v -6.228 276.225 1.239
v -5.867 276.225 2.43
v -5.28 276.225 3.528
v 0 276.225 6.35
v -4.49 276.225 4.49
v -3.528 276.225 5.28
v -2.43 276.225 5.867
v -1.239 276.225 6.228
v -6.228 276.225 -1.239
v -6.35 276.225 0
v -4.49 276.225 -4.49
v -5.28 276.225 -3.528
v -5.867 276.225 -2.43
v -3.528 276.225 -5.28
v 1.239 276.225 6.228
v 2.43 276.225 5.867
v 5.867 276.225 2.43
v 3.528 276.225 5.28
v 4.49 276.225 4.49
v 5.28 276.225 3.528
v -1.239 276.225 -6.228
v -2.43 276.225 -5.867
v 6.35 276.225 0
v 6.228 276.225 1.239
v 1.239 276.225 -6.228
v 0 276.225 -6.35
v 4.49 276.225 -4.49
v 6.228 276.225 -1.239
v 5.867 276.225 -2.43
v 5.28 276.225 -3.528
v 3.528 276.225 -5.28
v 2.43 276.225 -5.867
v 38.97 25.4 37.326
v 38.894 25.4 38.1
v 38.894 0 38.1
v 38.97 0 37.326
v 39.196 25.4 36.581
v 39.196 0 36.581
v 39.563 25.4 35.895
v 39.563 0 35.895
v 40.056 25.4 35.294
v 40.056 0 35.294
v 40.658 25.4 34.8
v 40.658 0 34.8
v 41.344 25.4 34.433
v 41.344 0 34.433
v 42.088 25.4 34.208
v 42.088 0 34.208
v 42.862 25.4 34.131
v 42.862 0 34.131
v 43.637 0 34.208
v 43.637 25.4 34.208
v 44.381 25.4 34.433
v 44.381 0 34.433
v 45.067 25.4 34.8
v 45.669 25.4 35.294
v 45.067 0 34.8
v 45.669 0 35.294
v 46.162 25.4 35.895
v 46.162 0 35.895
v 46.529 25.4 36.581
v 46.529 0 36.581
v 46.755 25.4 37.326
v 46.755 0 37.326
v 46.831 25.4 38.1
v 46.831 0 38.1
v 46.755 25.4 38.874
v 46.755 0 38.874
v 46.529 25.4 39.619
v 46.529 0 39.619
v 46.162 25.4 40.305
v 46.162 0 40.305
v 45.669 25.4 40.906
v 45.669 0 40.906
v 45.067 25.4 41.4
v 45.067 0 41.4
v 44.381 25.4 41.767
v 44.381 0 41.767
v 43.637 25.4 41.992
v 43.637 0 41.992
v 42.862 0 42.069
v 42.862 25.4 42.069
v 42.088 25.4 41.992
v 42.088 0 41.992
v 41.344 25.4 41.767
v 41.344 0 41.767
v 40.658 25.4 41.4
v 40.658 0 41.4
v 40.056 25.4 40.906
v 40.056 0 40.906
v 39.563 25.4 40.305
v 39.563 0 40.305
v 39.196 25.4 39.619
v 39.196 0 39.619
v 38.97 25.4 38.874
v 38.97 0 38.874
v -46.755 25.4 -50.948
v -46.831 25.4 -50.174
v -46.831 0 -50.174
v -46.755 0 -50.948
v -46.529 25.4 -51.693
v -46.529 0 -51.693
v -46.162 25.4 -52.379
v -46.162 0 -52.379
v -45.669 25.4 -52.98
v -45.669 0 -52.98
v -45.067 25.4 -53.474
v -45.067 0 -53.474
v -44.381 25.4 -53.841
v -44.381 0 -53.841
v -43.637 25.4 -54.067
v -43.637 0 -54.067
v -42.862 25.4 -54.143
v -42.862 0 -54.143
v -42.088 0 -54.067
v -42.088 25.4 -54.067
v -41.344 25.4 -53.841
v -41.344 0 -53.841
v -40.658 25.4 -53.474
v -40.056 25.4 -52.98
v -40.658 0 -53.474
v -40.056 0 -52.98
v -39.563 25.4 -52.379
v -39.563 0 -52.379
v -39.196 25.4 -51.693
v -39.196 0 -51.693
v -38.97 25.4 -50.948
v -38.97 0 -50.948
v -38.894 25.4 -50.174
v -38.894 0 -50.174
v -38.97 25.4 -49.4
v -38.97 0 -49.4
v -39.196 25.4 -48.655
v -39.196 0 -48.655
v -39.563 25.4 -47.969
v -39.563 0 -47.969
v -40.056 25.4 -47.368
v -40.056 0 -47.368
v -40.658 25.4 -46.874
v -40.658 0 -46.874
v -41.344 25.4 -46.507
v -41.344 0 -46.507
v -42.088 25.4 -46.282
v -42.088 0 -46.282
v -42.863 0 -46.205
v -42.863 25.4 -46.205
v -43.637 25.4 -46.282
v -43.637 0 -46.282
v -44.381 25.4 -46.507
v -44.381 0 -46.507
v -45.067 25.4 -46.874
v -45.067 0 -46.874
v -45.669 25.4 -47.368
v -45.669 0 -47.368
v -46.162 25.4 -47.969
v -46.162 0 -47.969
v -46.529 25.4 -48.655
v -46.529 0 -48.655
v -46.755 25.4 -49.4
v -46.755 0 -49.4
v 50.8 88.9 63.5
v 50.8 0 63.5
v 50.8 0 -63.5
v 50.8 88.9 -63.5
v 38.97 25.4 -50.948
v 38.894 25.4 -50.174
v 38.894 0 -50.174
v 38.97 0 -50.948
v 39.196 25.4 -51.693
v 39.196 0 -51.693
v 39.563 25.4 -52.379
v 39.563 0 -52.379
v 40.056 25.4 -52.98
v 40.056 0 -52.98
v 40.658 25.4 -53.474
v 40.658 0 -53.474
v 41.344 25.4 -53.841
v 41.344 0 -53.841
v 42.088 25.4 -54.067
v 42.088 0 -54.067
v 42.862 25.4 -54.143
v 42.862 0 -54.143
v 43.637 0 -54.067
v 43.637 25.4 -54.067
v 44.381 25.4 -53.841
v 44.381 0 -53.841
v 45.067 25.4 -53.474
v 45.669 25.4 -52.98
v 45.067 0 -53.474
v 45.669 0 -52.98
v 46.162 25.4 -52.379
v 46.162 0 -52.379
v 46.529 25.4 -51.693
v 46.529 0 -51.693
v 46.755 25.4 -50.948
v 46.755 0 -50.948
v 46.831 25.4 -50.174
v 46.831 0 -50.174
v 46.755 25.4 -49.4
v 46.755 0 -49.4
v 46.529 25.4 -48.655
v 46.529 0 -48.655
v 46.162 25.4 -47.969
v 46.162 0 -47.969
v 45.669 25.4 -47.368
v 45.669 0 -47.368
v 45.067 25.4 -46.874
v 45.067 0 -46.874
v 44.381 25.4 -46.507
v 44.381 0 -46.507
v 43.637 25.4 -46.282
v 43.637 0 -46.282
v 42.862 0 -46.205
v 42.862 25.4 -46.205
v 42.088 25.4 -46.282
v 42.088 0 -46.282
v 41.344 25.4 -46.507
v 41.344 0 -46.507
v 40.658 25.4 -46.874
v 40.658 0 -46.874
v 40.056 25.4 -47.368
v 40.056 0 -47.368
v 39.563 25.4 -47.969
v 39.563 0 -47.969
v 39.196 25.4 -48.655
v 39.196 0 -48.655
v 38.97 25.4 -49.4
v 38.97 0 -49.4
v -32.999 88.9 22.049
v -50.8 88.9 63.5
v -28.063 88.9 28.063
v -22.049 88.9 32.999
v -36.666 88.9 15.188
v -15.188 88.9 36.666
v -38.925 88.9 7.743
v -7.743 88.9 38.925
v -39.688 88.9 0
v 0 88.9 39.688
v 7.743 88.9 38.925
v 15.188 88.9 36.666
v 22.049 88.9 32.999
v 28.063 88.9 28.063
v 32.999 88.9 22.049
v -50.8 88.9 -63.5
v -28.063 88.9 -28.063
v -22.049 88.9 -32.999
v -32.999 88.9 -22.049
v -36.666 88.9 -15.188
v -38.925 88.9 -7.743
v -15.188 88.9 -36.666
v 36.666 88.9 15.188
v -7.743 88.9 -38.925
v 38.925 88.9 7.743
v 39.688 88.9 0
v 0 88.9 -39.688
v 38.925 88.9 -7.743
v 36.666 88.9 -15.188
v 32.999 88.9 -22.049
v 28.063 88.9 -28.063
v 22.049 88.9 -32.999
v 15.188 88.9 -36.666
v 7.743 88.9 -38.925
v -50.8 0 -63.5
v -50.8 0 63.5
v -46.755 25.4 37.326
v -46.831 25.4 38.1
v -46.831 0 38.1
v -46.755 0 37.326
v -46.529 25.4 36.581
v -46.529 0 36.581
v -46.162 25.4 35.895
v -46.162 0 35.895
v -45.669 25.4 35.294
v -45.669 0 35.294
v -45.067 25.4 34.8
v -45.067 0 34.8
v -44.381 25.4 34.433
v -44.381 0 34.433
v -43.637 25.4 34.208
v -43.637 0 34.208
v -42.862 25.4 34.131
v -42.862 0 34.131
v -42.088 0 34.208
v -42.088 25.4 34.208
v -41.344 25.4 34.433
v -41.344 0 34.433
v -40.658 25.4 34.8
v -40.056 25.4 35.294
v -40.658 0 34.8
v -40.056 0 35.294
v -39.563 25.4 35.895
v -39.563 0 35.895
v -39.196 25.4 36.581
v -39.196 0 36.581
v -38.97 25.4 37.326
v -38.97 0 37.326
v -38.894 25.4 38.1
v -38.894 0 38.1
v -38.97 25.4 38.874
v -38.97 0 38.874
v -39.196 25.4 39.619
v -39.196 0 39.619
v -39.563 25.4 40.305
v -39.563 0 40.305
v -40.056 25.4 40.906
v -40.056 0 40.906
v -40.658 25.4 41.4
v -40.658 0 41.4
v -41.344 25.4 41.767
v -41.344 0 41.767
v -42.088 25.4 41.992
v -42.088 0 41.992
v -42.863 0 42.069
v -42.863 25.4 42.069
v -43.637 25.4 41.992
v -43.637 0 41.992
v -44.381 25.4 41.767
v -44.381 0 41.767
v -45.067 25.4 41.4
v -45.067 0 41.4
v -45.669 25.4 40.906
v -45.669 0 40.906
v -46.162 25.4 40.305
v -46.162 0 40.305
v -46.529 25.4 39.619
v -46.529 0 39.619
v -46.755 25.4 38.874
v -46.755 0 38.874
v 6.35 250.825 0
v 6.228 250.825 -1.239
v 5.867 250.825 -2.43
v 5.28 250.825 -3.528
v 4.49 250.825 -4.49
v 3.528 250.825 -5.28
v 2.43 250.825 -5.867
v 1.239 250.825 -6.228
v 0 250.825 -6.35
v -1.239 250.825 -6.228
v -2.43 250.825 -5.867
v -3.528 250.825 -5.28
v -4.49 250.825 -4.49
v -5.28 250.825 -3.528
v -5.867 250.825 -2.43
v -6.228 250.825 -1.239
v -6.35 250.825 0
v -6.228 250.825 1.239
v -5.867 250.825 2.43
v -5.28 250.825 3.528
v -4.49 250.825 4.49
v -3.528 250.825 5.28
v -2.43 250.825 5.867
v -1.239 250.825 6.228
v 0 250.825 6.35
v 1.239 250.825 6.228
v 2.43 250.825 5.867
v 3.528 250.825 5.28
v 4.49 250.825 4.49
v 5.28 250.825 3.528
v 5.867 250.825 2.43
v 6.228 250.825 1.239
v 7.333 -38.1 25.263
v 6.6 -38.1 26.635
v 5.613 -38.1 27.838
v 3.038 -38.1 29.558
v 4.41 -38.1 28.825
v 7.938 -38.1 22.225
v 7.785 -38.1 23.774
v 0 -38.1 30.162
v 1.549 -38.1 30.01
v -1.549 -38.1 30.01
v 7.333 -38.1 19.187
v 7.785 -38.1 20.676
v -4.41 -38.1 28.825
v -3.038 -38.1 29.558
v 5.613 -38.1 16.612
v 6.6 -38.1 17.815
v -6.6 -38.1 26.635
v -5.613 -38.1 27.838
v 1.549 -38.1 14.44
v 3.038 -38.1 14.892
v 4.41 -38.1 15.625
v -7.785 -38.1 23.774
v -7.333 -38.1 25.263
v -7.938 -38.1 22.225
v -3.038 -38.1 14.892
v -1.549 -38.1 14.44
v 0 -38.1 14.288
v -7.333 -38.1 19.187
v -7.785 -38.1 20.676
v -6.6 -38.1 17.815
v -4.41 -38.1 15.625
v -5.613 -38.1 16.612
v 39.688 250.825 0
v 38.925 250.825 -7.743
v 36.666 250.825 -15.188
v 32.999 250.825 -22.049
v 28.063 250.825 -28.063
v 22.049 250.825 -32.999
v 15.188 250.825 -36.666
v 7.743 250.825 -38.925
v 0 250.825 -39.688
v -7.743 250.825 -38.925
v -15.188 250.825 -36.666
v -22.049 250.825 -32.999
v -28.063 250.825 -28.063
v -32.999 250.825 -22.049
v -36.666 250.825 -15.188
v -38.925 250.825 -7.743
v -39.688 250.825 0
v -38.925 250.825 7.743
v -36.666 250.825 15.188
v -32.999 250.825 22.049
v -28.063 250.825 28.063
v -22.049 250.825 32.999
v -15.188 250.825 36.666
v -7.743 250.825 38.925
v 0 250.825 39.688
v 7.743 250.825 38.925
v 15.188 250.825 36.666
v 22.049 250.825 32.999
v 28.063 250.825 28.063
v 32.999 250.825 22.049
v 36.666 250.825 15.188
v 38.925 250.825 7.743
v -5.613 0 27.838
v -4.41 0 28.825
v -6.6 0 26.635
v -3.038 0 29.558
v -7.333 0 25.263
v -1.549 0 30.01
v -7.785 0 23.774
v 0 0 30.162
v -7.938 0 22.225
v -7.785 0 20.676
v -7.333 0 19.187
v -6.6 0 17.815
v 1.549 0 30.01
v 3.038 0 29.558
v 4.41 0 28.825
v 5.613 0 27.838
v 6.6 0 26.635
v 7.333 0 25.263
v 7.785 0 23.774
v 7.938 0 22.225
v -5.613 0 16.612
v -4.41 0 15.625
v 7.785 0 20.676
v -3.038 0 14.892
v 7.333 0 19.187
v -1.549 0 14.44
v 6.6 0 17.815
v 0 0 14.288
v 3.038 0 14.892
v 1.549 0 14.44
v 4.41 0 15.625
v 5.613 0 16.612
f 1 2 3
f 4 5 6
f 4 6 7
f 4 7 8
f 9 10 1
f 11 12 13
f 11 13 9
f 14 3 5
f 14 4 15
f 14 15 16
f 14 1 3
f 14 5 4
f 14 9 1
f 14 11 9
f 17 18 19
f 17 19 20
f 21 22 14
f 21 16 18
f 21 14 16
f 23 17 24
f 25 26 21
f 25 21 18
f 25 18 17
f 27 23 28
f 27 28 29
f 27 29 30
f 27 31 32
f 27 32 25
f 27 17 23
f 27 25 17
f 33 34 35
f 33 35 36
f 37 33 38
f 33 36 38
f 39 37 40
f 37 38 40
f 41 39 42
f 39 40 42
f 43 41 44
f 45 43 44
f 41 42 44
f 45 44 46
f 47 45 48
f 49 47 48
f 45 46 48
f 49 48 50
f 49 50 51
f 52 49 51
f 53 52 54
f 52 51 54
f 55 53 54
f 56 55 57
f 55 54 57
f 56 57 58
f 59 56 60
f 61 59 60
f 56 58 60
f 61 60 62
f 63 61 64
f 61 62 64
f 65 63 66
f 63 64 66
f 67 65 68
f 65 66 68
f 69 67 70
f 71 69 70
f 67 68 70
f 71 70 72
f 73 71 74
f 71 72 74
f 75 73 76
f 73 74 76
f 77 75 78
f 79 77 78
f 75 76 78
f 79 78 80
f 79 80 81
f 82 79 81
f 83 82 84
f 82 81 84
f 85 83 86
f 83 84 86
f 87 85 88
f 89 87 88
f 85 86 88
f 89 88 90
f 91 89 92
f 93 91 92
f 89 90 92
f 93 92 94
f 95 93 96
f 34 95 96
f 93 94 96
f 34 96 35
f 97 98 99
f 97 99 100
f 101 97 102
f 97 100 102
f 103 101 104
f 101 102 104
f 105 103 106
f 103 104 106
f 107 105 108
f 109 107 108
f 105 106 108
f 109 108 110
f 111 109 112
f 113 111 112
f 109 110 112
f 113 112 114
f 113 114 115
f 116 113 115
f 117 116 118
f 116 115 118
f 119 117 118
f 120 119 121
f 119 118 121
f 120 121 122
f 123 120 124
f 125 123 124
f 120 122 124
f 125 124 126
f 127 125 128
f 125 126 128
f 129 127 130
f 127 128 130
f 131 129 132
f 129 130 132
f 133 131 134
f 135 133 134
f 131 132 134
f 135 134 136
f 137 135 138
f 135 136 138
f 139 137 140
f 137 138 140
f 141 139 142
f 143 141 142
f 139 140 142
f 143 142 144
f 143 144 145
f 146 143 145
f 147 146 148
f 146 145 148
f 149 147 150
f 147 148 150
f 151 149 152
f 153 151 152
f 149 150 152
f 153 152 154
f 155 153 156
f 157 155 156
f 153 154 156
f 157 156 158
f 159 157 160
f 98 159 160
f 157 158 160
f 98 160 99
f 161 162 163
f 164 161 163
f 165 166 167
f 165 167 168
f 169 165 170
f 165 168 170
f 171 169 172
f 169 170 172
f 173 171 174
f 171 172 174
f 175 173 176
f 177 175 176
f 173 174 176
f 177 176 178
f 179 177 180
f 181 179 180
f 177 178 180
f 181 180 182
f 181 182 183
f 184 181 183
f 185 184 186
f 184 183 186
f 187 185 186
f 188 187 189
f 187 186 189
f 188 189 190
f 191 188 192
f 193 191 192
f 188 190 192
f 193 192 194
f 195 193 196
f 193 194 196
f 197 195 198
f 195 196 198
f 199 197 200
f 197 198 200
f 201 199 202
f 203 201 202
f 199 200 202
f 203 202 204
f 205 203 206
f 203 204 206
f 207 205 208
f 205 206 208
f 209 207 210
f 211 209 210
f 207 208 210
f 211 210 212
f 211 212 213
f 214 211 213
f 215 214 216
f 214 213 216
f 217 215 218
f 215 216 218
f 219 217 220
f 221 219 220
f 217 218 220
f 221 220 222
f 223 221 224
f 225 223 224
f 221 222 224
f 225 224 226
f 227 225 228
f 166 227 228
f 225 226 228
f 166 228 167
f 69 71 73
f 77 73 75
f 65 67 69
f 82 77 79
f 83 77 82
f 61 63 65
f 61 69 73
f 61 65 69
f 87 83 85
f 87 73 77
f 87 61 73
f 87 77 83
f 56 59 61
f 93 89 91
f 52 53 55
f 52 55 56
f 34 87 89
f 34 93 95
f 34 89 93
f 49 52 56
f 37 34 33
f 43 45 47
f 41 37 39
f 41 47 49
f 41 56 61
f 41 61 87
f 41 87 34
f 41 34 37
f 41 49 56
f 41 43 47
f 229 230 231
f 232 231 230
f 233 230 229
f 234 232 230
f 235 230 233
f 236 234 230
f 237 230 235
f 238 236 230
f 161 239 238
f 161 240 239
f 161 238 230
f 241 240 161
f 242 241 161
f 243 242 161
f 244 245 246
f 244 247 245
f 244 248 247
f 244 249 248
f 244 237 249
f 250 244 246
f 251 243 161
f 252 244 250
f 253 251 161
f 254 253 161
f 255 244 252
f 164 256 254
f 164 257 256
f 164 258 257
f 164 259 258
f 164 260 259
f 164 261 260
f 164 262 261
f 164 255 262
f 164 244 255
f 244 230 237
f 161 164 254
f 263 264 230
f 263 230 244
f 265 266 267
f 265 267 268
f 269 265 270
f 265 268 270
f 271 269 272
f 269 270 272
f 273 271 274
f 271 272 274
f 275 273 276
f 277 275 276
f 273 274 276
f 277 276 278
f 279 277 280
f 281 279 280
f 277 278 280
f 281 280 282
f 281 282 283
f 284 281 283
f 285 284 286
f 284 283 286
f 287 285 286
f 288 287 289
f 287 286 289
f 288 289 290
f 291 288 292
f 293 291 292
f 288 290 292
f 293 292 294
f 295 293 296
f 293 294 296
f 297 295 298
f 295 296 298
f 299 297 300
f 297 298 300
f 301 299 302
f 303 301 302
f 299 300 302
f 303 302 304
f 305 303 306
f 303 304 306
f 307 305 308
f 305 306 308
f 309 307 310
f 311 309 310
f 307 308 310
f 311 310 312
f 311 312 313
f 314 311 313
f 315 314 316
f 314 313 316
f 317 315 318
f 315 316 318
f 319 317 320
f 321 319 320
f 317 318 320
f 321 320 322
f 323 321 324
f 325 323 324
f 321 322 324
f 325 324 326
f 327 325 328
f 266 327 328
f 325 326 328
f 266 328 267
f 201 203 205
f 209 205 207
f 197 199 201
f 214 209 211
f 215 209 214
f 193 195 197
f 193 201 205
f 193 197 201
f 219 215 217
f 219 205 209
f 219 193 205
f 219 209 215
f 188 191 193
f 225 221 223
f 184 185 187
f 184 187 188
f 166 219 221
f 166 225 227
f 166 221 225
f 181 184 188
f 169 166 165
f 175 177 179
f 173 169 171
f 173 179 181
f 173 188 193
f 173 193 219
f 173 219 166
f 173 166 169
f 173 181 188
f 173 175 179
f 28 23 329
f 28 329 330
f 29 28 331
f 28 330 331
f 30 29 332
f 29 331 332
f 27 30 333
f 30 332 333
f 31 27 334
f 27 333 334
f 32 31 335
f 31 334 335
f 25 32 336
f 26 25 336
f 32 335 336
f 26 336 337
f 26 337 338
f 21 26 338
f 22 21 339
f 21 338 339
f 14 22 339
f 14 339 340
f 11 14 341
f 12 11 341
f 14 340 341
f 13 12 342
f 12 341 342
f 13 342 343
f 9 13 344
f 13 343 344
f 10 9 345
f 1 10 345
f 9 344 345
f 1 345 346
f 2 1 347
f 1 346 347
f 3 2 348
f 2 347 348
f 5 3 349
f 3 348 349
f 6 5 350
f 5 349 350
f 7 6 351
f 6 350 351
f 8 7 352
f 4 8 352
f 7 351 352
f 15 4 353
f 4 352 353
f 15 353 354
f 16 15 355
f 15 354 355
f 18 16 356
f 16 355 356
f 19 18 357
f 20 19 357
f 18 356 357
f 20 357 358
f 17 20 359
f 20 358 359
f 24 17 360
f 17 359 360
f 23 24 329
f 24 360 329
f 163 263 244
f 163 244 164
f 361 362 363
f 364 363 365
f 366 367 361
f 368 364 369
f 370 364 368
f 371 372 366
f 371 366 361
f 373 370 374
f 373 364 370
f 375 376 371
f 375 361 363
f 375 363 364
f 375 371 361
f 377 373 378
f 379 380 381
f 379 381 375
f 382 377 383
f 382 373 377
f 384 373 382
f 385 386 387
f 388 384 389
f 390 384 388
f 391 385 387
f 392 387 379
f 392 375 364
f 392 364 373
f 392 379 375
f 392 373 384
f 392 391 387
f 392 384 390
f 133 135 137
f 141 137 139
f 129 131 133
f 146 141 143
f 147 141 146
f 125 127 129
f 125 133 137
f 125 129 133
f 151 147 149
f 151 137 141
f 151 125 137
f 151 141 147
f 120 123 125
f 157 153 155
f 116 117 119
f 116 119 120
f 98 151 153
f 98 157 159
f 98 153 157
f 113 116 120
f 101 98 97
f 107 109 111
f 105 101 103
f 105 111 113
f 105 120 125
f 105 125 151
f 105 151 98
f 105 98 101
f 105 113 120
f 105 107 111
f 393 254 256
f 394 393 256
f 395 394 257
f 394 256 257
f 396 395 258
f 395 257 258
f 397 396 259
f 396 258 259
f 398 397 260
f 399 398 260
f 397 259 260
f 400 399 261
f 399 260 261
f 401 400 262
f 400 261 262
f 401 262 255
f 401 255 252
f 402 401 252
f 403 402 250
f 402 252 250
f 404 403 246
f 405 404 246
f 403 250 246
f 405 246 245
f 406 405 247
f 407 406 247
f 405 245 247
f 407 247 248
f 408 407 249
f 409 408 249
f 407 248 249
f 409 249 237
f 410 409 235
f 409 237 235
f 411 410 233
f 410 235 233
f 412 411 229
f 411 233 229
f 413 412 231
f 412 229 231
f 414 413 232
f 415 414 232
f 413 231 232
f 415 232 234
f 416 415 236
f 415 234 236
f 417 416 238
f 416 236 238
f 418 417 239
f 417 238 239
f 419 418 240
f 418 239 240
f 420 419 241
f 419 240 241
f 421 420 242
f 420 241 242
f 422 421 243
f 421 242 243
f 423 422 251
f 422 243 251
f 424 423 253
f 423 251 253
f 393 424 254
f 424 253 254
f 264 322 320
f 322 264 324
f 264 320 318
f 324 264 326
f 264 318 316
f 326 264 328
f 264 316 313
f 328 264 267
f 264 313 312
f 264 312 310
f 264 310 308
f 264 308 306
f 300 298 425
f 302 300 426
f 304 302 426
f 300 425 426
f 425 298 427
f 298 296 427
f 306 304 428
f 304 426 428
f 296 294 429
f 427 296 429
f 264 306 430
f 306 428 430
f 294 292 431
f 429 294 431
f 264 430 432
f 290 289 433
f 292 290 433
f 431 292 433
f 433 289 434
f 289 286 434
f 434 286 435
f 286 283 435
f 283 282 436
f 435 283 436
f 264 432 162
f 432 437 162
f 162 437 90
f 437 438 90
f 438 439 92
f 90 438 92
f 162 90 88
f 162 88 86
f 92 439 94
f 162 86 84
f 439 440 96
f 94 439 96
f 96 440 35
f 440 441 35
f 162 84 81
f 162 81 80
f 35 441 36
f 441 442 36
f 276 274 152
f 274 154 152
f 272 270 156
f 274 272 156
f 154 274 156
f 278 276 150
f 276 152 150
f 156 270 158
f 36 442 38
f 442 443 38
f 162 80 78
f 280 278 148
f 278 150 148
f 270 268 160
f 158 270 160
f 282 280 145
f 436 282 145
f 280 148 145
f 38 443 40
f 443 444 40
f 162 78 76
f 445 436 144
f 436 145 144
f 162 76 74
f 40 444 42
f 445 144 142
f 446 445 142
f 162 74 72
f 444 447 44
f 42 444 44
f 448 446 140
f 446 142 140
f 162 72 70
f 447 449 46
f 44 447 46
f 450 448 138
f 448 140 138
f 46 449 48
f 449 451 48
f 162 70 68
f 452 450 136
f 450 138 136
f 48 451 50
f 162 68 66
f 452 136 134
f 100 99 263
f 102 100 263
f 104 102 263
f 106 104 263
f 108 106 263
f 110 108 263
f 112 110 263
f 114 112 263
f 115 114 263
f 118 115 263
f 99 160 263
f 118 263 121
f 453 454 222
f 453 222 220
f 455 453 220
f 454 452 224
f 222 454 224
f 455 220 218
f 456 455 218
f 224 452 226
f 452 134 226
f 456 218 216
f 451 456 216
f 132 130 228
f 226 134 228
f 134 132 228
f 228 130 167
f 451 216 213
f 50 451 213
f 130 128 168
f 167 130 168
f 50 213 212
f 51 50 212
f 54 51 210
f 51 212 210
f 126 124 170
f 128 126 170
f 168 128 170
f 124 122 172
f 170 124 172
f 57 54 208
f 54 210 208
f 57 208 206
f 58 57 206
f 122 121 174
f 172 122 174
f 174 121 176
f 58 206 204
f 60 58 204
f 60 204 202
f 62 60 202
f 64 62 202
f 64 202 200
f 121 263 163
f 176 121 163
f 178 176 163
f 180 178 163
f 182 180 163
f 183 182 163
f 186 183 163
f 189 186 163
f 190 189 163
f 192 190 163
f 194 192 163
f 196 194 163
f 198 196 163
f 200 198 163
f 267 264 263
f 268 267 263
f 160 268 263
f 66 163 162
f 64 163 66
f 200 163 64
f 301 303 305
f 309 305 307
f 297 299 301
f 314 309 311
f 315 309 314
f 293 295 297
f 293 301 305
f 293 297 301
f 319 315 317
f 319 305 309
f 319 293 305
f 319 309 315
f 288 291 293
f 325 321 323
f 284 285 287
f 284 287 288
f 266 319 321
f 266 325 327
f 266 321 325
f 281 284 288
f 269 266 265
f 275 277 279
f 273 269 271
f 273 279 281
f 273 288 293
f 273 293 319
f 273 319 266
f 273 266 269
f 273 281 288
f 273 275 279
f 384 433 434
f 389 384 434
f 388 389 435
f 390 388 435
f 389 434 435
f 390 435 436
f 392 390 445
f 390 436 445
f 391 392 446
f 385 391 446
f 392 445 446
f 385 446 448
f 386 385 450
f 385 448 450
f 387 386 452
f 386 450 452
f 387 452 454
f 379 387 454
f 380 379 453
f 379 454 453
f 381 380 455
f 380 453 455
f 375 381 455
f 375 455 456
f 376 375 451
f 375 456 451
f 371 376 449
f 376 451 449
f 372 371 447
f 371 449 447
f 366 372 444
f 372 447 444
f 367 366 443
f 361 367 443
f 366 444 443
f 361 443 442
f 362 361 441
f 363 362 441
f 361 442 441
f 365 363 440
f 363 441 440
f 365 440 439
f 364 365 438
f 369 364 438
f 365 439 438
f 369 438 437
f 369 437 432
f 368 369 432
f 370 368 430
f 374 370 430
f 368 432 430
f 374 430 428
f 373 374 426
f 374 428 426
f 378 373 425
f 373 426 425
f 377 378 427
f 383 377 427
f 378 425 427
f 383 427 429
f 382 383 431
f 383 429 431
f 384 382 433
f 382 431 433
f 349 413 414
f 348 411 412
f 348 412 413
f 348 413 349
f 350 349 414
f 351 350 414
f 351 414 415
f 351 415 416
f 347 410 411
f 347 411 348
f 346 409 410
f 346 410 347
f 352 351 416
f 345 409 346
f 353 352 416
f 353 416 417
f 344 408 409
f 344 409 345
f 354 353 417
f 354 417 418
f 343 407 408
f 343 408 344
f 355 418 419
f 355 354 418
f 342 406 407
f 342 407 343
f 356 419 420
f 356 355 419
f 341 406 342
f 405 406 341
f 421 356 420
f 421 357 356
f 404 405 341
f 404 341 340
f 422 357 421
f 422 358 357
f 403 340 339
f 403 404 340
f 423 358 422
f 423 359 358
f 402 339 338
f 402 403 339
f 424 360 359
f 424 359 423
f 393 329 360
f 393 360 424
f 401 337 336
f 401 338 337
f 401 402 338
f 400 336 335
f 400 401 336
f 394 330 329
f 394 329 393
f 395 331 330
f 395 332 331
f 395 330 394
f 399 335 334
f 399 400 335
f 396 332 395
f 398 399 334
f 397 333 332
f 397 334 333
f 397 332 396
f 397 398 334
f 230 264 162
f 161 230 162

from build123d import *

# Parameters (mm, degrees)
SKETCH1_W           = 101.6
SKETCH1_H           = 127
BOSS_EXTRUDE2_DEPTH = 88.9
SKETCH3_R           = 39.6875
BOSS_EXTRUDE3_DEPTH = 161.925
SKETCH4_R           = 6.35
BOSS_EXTRUDE4_DEPTH = 25.4
SKETCH5_R           = 7.9375
BOSS_EXTRUDE5_DEPTH = 38.1
SKETCH6_R           = 3.96875
CUT_EXTRUDE1_DEPTH  = 25.4


with BuildPart() as part:
    # Sketch1 → Boss-Extrude2 (new body)
    with BuildSketch(Plane(origin=(0, 0, 0), x_dir=(1, 0, 0), z_dir=(0, 1, 0))):
        Rectangle(SKETCH1_W, SKETCH1_H)
    extrude(amount=BOSS_EXTRUDE2_DEPTH)

    # Sketch3 → Boss-Extrude3 (add)
    with BuildSketch(Plane(origin=(0, 88.9, 0), x_dir=(1, 0, 0), z_dir=(0, 1, 0))):
        Circle(SKETCH3_R)
    extrude(amount=BOSS_EXTRUDE3_DEPTH)

    # Sketch4 → Boss-Extrude4 (add)
    with BuildSketch(Plane(origin=(0, 250.825, 0), x_dir=(1, 0, 0), z_dir=(0, 1, 0))):
        Circle(SKETCH4_R)
    extrude(amount=BOSS_EXTRUDE4_DEPTH)

    # Sketch5 → Boss-Extrude5 (add)
    with BuildSketch(Plane(origin=(0, 0, 0), x_dir=(-1, 0, 0), z_dir=(0, -1, 0))):
        with Locations((0, -22.225)):
            Circle(SKETCH5_R)
    extrude(amount=BOSS_EXTRUDE5_DEPTH)

    # Sketch6 → Cut-Extrude1 (cut)
    with BuildSketch(Plane(origin=(0, 0, 0), x_dir=(-1, 0, 0), z_dir=(0, -1, 0))):
        with Locations((42.8625, -38.1)):
            Circle(SKETCH6_R)
        with Locations((-42.8625, -38.1)):
            Circle(SKETCH6_R)
        with Locations((42.8625, 50.174061918)):
            Circle(SKETCH6_R)
        with Locations((-42.8625, 50.174061918)):
            Circle(SKETCH6_R)
    extrude(amount=-CUT_EXTRUDE1_DEPTH, mode=Mode.SUBTRACT)


solid = part.part
